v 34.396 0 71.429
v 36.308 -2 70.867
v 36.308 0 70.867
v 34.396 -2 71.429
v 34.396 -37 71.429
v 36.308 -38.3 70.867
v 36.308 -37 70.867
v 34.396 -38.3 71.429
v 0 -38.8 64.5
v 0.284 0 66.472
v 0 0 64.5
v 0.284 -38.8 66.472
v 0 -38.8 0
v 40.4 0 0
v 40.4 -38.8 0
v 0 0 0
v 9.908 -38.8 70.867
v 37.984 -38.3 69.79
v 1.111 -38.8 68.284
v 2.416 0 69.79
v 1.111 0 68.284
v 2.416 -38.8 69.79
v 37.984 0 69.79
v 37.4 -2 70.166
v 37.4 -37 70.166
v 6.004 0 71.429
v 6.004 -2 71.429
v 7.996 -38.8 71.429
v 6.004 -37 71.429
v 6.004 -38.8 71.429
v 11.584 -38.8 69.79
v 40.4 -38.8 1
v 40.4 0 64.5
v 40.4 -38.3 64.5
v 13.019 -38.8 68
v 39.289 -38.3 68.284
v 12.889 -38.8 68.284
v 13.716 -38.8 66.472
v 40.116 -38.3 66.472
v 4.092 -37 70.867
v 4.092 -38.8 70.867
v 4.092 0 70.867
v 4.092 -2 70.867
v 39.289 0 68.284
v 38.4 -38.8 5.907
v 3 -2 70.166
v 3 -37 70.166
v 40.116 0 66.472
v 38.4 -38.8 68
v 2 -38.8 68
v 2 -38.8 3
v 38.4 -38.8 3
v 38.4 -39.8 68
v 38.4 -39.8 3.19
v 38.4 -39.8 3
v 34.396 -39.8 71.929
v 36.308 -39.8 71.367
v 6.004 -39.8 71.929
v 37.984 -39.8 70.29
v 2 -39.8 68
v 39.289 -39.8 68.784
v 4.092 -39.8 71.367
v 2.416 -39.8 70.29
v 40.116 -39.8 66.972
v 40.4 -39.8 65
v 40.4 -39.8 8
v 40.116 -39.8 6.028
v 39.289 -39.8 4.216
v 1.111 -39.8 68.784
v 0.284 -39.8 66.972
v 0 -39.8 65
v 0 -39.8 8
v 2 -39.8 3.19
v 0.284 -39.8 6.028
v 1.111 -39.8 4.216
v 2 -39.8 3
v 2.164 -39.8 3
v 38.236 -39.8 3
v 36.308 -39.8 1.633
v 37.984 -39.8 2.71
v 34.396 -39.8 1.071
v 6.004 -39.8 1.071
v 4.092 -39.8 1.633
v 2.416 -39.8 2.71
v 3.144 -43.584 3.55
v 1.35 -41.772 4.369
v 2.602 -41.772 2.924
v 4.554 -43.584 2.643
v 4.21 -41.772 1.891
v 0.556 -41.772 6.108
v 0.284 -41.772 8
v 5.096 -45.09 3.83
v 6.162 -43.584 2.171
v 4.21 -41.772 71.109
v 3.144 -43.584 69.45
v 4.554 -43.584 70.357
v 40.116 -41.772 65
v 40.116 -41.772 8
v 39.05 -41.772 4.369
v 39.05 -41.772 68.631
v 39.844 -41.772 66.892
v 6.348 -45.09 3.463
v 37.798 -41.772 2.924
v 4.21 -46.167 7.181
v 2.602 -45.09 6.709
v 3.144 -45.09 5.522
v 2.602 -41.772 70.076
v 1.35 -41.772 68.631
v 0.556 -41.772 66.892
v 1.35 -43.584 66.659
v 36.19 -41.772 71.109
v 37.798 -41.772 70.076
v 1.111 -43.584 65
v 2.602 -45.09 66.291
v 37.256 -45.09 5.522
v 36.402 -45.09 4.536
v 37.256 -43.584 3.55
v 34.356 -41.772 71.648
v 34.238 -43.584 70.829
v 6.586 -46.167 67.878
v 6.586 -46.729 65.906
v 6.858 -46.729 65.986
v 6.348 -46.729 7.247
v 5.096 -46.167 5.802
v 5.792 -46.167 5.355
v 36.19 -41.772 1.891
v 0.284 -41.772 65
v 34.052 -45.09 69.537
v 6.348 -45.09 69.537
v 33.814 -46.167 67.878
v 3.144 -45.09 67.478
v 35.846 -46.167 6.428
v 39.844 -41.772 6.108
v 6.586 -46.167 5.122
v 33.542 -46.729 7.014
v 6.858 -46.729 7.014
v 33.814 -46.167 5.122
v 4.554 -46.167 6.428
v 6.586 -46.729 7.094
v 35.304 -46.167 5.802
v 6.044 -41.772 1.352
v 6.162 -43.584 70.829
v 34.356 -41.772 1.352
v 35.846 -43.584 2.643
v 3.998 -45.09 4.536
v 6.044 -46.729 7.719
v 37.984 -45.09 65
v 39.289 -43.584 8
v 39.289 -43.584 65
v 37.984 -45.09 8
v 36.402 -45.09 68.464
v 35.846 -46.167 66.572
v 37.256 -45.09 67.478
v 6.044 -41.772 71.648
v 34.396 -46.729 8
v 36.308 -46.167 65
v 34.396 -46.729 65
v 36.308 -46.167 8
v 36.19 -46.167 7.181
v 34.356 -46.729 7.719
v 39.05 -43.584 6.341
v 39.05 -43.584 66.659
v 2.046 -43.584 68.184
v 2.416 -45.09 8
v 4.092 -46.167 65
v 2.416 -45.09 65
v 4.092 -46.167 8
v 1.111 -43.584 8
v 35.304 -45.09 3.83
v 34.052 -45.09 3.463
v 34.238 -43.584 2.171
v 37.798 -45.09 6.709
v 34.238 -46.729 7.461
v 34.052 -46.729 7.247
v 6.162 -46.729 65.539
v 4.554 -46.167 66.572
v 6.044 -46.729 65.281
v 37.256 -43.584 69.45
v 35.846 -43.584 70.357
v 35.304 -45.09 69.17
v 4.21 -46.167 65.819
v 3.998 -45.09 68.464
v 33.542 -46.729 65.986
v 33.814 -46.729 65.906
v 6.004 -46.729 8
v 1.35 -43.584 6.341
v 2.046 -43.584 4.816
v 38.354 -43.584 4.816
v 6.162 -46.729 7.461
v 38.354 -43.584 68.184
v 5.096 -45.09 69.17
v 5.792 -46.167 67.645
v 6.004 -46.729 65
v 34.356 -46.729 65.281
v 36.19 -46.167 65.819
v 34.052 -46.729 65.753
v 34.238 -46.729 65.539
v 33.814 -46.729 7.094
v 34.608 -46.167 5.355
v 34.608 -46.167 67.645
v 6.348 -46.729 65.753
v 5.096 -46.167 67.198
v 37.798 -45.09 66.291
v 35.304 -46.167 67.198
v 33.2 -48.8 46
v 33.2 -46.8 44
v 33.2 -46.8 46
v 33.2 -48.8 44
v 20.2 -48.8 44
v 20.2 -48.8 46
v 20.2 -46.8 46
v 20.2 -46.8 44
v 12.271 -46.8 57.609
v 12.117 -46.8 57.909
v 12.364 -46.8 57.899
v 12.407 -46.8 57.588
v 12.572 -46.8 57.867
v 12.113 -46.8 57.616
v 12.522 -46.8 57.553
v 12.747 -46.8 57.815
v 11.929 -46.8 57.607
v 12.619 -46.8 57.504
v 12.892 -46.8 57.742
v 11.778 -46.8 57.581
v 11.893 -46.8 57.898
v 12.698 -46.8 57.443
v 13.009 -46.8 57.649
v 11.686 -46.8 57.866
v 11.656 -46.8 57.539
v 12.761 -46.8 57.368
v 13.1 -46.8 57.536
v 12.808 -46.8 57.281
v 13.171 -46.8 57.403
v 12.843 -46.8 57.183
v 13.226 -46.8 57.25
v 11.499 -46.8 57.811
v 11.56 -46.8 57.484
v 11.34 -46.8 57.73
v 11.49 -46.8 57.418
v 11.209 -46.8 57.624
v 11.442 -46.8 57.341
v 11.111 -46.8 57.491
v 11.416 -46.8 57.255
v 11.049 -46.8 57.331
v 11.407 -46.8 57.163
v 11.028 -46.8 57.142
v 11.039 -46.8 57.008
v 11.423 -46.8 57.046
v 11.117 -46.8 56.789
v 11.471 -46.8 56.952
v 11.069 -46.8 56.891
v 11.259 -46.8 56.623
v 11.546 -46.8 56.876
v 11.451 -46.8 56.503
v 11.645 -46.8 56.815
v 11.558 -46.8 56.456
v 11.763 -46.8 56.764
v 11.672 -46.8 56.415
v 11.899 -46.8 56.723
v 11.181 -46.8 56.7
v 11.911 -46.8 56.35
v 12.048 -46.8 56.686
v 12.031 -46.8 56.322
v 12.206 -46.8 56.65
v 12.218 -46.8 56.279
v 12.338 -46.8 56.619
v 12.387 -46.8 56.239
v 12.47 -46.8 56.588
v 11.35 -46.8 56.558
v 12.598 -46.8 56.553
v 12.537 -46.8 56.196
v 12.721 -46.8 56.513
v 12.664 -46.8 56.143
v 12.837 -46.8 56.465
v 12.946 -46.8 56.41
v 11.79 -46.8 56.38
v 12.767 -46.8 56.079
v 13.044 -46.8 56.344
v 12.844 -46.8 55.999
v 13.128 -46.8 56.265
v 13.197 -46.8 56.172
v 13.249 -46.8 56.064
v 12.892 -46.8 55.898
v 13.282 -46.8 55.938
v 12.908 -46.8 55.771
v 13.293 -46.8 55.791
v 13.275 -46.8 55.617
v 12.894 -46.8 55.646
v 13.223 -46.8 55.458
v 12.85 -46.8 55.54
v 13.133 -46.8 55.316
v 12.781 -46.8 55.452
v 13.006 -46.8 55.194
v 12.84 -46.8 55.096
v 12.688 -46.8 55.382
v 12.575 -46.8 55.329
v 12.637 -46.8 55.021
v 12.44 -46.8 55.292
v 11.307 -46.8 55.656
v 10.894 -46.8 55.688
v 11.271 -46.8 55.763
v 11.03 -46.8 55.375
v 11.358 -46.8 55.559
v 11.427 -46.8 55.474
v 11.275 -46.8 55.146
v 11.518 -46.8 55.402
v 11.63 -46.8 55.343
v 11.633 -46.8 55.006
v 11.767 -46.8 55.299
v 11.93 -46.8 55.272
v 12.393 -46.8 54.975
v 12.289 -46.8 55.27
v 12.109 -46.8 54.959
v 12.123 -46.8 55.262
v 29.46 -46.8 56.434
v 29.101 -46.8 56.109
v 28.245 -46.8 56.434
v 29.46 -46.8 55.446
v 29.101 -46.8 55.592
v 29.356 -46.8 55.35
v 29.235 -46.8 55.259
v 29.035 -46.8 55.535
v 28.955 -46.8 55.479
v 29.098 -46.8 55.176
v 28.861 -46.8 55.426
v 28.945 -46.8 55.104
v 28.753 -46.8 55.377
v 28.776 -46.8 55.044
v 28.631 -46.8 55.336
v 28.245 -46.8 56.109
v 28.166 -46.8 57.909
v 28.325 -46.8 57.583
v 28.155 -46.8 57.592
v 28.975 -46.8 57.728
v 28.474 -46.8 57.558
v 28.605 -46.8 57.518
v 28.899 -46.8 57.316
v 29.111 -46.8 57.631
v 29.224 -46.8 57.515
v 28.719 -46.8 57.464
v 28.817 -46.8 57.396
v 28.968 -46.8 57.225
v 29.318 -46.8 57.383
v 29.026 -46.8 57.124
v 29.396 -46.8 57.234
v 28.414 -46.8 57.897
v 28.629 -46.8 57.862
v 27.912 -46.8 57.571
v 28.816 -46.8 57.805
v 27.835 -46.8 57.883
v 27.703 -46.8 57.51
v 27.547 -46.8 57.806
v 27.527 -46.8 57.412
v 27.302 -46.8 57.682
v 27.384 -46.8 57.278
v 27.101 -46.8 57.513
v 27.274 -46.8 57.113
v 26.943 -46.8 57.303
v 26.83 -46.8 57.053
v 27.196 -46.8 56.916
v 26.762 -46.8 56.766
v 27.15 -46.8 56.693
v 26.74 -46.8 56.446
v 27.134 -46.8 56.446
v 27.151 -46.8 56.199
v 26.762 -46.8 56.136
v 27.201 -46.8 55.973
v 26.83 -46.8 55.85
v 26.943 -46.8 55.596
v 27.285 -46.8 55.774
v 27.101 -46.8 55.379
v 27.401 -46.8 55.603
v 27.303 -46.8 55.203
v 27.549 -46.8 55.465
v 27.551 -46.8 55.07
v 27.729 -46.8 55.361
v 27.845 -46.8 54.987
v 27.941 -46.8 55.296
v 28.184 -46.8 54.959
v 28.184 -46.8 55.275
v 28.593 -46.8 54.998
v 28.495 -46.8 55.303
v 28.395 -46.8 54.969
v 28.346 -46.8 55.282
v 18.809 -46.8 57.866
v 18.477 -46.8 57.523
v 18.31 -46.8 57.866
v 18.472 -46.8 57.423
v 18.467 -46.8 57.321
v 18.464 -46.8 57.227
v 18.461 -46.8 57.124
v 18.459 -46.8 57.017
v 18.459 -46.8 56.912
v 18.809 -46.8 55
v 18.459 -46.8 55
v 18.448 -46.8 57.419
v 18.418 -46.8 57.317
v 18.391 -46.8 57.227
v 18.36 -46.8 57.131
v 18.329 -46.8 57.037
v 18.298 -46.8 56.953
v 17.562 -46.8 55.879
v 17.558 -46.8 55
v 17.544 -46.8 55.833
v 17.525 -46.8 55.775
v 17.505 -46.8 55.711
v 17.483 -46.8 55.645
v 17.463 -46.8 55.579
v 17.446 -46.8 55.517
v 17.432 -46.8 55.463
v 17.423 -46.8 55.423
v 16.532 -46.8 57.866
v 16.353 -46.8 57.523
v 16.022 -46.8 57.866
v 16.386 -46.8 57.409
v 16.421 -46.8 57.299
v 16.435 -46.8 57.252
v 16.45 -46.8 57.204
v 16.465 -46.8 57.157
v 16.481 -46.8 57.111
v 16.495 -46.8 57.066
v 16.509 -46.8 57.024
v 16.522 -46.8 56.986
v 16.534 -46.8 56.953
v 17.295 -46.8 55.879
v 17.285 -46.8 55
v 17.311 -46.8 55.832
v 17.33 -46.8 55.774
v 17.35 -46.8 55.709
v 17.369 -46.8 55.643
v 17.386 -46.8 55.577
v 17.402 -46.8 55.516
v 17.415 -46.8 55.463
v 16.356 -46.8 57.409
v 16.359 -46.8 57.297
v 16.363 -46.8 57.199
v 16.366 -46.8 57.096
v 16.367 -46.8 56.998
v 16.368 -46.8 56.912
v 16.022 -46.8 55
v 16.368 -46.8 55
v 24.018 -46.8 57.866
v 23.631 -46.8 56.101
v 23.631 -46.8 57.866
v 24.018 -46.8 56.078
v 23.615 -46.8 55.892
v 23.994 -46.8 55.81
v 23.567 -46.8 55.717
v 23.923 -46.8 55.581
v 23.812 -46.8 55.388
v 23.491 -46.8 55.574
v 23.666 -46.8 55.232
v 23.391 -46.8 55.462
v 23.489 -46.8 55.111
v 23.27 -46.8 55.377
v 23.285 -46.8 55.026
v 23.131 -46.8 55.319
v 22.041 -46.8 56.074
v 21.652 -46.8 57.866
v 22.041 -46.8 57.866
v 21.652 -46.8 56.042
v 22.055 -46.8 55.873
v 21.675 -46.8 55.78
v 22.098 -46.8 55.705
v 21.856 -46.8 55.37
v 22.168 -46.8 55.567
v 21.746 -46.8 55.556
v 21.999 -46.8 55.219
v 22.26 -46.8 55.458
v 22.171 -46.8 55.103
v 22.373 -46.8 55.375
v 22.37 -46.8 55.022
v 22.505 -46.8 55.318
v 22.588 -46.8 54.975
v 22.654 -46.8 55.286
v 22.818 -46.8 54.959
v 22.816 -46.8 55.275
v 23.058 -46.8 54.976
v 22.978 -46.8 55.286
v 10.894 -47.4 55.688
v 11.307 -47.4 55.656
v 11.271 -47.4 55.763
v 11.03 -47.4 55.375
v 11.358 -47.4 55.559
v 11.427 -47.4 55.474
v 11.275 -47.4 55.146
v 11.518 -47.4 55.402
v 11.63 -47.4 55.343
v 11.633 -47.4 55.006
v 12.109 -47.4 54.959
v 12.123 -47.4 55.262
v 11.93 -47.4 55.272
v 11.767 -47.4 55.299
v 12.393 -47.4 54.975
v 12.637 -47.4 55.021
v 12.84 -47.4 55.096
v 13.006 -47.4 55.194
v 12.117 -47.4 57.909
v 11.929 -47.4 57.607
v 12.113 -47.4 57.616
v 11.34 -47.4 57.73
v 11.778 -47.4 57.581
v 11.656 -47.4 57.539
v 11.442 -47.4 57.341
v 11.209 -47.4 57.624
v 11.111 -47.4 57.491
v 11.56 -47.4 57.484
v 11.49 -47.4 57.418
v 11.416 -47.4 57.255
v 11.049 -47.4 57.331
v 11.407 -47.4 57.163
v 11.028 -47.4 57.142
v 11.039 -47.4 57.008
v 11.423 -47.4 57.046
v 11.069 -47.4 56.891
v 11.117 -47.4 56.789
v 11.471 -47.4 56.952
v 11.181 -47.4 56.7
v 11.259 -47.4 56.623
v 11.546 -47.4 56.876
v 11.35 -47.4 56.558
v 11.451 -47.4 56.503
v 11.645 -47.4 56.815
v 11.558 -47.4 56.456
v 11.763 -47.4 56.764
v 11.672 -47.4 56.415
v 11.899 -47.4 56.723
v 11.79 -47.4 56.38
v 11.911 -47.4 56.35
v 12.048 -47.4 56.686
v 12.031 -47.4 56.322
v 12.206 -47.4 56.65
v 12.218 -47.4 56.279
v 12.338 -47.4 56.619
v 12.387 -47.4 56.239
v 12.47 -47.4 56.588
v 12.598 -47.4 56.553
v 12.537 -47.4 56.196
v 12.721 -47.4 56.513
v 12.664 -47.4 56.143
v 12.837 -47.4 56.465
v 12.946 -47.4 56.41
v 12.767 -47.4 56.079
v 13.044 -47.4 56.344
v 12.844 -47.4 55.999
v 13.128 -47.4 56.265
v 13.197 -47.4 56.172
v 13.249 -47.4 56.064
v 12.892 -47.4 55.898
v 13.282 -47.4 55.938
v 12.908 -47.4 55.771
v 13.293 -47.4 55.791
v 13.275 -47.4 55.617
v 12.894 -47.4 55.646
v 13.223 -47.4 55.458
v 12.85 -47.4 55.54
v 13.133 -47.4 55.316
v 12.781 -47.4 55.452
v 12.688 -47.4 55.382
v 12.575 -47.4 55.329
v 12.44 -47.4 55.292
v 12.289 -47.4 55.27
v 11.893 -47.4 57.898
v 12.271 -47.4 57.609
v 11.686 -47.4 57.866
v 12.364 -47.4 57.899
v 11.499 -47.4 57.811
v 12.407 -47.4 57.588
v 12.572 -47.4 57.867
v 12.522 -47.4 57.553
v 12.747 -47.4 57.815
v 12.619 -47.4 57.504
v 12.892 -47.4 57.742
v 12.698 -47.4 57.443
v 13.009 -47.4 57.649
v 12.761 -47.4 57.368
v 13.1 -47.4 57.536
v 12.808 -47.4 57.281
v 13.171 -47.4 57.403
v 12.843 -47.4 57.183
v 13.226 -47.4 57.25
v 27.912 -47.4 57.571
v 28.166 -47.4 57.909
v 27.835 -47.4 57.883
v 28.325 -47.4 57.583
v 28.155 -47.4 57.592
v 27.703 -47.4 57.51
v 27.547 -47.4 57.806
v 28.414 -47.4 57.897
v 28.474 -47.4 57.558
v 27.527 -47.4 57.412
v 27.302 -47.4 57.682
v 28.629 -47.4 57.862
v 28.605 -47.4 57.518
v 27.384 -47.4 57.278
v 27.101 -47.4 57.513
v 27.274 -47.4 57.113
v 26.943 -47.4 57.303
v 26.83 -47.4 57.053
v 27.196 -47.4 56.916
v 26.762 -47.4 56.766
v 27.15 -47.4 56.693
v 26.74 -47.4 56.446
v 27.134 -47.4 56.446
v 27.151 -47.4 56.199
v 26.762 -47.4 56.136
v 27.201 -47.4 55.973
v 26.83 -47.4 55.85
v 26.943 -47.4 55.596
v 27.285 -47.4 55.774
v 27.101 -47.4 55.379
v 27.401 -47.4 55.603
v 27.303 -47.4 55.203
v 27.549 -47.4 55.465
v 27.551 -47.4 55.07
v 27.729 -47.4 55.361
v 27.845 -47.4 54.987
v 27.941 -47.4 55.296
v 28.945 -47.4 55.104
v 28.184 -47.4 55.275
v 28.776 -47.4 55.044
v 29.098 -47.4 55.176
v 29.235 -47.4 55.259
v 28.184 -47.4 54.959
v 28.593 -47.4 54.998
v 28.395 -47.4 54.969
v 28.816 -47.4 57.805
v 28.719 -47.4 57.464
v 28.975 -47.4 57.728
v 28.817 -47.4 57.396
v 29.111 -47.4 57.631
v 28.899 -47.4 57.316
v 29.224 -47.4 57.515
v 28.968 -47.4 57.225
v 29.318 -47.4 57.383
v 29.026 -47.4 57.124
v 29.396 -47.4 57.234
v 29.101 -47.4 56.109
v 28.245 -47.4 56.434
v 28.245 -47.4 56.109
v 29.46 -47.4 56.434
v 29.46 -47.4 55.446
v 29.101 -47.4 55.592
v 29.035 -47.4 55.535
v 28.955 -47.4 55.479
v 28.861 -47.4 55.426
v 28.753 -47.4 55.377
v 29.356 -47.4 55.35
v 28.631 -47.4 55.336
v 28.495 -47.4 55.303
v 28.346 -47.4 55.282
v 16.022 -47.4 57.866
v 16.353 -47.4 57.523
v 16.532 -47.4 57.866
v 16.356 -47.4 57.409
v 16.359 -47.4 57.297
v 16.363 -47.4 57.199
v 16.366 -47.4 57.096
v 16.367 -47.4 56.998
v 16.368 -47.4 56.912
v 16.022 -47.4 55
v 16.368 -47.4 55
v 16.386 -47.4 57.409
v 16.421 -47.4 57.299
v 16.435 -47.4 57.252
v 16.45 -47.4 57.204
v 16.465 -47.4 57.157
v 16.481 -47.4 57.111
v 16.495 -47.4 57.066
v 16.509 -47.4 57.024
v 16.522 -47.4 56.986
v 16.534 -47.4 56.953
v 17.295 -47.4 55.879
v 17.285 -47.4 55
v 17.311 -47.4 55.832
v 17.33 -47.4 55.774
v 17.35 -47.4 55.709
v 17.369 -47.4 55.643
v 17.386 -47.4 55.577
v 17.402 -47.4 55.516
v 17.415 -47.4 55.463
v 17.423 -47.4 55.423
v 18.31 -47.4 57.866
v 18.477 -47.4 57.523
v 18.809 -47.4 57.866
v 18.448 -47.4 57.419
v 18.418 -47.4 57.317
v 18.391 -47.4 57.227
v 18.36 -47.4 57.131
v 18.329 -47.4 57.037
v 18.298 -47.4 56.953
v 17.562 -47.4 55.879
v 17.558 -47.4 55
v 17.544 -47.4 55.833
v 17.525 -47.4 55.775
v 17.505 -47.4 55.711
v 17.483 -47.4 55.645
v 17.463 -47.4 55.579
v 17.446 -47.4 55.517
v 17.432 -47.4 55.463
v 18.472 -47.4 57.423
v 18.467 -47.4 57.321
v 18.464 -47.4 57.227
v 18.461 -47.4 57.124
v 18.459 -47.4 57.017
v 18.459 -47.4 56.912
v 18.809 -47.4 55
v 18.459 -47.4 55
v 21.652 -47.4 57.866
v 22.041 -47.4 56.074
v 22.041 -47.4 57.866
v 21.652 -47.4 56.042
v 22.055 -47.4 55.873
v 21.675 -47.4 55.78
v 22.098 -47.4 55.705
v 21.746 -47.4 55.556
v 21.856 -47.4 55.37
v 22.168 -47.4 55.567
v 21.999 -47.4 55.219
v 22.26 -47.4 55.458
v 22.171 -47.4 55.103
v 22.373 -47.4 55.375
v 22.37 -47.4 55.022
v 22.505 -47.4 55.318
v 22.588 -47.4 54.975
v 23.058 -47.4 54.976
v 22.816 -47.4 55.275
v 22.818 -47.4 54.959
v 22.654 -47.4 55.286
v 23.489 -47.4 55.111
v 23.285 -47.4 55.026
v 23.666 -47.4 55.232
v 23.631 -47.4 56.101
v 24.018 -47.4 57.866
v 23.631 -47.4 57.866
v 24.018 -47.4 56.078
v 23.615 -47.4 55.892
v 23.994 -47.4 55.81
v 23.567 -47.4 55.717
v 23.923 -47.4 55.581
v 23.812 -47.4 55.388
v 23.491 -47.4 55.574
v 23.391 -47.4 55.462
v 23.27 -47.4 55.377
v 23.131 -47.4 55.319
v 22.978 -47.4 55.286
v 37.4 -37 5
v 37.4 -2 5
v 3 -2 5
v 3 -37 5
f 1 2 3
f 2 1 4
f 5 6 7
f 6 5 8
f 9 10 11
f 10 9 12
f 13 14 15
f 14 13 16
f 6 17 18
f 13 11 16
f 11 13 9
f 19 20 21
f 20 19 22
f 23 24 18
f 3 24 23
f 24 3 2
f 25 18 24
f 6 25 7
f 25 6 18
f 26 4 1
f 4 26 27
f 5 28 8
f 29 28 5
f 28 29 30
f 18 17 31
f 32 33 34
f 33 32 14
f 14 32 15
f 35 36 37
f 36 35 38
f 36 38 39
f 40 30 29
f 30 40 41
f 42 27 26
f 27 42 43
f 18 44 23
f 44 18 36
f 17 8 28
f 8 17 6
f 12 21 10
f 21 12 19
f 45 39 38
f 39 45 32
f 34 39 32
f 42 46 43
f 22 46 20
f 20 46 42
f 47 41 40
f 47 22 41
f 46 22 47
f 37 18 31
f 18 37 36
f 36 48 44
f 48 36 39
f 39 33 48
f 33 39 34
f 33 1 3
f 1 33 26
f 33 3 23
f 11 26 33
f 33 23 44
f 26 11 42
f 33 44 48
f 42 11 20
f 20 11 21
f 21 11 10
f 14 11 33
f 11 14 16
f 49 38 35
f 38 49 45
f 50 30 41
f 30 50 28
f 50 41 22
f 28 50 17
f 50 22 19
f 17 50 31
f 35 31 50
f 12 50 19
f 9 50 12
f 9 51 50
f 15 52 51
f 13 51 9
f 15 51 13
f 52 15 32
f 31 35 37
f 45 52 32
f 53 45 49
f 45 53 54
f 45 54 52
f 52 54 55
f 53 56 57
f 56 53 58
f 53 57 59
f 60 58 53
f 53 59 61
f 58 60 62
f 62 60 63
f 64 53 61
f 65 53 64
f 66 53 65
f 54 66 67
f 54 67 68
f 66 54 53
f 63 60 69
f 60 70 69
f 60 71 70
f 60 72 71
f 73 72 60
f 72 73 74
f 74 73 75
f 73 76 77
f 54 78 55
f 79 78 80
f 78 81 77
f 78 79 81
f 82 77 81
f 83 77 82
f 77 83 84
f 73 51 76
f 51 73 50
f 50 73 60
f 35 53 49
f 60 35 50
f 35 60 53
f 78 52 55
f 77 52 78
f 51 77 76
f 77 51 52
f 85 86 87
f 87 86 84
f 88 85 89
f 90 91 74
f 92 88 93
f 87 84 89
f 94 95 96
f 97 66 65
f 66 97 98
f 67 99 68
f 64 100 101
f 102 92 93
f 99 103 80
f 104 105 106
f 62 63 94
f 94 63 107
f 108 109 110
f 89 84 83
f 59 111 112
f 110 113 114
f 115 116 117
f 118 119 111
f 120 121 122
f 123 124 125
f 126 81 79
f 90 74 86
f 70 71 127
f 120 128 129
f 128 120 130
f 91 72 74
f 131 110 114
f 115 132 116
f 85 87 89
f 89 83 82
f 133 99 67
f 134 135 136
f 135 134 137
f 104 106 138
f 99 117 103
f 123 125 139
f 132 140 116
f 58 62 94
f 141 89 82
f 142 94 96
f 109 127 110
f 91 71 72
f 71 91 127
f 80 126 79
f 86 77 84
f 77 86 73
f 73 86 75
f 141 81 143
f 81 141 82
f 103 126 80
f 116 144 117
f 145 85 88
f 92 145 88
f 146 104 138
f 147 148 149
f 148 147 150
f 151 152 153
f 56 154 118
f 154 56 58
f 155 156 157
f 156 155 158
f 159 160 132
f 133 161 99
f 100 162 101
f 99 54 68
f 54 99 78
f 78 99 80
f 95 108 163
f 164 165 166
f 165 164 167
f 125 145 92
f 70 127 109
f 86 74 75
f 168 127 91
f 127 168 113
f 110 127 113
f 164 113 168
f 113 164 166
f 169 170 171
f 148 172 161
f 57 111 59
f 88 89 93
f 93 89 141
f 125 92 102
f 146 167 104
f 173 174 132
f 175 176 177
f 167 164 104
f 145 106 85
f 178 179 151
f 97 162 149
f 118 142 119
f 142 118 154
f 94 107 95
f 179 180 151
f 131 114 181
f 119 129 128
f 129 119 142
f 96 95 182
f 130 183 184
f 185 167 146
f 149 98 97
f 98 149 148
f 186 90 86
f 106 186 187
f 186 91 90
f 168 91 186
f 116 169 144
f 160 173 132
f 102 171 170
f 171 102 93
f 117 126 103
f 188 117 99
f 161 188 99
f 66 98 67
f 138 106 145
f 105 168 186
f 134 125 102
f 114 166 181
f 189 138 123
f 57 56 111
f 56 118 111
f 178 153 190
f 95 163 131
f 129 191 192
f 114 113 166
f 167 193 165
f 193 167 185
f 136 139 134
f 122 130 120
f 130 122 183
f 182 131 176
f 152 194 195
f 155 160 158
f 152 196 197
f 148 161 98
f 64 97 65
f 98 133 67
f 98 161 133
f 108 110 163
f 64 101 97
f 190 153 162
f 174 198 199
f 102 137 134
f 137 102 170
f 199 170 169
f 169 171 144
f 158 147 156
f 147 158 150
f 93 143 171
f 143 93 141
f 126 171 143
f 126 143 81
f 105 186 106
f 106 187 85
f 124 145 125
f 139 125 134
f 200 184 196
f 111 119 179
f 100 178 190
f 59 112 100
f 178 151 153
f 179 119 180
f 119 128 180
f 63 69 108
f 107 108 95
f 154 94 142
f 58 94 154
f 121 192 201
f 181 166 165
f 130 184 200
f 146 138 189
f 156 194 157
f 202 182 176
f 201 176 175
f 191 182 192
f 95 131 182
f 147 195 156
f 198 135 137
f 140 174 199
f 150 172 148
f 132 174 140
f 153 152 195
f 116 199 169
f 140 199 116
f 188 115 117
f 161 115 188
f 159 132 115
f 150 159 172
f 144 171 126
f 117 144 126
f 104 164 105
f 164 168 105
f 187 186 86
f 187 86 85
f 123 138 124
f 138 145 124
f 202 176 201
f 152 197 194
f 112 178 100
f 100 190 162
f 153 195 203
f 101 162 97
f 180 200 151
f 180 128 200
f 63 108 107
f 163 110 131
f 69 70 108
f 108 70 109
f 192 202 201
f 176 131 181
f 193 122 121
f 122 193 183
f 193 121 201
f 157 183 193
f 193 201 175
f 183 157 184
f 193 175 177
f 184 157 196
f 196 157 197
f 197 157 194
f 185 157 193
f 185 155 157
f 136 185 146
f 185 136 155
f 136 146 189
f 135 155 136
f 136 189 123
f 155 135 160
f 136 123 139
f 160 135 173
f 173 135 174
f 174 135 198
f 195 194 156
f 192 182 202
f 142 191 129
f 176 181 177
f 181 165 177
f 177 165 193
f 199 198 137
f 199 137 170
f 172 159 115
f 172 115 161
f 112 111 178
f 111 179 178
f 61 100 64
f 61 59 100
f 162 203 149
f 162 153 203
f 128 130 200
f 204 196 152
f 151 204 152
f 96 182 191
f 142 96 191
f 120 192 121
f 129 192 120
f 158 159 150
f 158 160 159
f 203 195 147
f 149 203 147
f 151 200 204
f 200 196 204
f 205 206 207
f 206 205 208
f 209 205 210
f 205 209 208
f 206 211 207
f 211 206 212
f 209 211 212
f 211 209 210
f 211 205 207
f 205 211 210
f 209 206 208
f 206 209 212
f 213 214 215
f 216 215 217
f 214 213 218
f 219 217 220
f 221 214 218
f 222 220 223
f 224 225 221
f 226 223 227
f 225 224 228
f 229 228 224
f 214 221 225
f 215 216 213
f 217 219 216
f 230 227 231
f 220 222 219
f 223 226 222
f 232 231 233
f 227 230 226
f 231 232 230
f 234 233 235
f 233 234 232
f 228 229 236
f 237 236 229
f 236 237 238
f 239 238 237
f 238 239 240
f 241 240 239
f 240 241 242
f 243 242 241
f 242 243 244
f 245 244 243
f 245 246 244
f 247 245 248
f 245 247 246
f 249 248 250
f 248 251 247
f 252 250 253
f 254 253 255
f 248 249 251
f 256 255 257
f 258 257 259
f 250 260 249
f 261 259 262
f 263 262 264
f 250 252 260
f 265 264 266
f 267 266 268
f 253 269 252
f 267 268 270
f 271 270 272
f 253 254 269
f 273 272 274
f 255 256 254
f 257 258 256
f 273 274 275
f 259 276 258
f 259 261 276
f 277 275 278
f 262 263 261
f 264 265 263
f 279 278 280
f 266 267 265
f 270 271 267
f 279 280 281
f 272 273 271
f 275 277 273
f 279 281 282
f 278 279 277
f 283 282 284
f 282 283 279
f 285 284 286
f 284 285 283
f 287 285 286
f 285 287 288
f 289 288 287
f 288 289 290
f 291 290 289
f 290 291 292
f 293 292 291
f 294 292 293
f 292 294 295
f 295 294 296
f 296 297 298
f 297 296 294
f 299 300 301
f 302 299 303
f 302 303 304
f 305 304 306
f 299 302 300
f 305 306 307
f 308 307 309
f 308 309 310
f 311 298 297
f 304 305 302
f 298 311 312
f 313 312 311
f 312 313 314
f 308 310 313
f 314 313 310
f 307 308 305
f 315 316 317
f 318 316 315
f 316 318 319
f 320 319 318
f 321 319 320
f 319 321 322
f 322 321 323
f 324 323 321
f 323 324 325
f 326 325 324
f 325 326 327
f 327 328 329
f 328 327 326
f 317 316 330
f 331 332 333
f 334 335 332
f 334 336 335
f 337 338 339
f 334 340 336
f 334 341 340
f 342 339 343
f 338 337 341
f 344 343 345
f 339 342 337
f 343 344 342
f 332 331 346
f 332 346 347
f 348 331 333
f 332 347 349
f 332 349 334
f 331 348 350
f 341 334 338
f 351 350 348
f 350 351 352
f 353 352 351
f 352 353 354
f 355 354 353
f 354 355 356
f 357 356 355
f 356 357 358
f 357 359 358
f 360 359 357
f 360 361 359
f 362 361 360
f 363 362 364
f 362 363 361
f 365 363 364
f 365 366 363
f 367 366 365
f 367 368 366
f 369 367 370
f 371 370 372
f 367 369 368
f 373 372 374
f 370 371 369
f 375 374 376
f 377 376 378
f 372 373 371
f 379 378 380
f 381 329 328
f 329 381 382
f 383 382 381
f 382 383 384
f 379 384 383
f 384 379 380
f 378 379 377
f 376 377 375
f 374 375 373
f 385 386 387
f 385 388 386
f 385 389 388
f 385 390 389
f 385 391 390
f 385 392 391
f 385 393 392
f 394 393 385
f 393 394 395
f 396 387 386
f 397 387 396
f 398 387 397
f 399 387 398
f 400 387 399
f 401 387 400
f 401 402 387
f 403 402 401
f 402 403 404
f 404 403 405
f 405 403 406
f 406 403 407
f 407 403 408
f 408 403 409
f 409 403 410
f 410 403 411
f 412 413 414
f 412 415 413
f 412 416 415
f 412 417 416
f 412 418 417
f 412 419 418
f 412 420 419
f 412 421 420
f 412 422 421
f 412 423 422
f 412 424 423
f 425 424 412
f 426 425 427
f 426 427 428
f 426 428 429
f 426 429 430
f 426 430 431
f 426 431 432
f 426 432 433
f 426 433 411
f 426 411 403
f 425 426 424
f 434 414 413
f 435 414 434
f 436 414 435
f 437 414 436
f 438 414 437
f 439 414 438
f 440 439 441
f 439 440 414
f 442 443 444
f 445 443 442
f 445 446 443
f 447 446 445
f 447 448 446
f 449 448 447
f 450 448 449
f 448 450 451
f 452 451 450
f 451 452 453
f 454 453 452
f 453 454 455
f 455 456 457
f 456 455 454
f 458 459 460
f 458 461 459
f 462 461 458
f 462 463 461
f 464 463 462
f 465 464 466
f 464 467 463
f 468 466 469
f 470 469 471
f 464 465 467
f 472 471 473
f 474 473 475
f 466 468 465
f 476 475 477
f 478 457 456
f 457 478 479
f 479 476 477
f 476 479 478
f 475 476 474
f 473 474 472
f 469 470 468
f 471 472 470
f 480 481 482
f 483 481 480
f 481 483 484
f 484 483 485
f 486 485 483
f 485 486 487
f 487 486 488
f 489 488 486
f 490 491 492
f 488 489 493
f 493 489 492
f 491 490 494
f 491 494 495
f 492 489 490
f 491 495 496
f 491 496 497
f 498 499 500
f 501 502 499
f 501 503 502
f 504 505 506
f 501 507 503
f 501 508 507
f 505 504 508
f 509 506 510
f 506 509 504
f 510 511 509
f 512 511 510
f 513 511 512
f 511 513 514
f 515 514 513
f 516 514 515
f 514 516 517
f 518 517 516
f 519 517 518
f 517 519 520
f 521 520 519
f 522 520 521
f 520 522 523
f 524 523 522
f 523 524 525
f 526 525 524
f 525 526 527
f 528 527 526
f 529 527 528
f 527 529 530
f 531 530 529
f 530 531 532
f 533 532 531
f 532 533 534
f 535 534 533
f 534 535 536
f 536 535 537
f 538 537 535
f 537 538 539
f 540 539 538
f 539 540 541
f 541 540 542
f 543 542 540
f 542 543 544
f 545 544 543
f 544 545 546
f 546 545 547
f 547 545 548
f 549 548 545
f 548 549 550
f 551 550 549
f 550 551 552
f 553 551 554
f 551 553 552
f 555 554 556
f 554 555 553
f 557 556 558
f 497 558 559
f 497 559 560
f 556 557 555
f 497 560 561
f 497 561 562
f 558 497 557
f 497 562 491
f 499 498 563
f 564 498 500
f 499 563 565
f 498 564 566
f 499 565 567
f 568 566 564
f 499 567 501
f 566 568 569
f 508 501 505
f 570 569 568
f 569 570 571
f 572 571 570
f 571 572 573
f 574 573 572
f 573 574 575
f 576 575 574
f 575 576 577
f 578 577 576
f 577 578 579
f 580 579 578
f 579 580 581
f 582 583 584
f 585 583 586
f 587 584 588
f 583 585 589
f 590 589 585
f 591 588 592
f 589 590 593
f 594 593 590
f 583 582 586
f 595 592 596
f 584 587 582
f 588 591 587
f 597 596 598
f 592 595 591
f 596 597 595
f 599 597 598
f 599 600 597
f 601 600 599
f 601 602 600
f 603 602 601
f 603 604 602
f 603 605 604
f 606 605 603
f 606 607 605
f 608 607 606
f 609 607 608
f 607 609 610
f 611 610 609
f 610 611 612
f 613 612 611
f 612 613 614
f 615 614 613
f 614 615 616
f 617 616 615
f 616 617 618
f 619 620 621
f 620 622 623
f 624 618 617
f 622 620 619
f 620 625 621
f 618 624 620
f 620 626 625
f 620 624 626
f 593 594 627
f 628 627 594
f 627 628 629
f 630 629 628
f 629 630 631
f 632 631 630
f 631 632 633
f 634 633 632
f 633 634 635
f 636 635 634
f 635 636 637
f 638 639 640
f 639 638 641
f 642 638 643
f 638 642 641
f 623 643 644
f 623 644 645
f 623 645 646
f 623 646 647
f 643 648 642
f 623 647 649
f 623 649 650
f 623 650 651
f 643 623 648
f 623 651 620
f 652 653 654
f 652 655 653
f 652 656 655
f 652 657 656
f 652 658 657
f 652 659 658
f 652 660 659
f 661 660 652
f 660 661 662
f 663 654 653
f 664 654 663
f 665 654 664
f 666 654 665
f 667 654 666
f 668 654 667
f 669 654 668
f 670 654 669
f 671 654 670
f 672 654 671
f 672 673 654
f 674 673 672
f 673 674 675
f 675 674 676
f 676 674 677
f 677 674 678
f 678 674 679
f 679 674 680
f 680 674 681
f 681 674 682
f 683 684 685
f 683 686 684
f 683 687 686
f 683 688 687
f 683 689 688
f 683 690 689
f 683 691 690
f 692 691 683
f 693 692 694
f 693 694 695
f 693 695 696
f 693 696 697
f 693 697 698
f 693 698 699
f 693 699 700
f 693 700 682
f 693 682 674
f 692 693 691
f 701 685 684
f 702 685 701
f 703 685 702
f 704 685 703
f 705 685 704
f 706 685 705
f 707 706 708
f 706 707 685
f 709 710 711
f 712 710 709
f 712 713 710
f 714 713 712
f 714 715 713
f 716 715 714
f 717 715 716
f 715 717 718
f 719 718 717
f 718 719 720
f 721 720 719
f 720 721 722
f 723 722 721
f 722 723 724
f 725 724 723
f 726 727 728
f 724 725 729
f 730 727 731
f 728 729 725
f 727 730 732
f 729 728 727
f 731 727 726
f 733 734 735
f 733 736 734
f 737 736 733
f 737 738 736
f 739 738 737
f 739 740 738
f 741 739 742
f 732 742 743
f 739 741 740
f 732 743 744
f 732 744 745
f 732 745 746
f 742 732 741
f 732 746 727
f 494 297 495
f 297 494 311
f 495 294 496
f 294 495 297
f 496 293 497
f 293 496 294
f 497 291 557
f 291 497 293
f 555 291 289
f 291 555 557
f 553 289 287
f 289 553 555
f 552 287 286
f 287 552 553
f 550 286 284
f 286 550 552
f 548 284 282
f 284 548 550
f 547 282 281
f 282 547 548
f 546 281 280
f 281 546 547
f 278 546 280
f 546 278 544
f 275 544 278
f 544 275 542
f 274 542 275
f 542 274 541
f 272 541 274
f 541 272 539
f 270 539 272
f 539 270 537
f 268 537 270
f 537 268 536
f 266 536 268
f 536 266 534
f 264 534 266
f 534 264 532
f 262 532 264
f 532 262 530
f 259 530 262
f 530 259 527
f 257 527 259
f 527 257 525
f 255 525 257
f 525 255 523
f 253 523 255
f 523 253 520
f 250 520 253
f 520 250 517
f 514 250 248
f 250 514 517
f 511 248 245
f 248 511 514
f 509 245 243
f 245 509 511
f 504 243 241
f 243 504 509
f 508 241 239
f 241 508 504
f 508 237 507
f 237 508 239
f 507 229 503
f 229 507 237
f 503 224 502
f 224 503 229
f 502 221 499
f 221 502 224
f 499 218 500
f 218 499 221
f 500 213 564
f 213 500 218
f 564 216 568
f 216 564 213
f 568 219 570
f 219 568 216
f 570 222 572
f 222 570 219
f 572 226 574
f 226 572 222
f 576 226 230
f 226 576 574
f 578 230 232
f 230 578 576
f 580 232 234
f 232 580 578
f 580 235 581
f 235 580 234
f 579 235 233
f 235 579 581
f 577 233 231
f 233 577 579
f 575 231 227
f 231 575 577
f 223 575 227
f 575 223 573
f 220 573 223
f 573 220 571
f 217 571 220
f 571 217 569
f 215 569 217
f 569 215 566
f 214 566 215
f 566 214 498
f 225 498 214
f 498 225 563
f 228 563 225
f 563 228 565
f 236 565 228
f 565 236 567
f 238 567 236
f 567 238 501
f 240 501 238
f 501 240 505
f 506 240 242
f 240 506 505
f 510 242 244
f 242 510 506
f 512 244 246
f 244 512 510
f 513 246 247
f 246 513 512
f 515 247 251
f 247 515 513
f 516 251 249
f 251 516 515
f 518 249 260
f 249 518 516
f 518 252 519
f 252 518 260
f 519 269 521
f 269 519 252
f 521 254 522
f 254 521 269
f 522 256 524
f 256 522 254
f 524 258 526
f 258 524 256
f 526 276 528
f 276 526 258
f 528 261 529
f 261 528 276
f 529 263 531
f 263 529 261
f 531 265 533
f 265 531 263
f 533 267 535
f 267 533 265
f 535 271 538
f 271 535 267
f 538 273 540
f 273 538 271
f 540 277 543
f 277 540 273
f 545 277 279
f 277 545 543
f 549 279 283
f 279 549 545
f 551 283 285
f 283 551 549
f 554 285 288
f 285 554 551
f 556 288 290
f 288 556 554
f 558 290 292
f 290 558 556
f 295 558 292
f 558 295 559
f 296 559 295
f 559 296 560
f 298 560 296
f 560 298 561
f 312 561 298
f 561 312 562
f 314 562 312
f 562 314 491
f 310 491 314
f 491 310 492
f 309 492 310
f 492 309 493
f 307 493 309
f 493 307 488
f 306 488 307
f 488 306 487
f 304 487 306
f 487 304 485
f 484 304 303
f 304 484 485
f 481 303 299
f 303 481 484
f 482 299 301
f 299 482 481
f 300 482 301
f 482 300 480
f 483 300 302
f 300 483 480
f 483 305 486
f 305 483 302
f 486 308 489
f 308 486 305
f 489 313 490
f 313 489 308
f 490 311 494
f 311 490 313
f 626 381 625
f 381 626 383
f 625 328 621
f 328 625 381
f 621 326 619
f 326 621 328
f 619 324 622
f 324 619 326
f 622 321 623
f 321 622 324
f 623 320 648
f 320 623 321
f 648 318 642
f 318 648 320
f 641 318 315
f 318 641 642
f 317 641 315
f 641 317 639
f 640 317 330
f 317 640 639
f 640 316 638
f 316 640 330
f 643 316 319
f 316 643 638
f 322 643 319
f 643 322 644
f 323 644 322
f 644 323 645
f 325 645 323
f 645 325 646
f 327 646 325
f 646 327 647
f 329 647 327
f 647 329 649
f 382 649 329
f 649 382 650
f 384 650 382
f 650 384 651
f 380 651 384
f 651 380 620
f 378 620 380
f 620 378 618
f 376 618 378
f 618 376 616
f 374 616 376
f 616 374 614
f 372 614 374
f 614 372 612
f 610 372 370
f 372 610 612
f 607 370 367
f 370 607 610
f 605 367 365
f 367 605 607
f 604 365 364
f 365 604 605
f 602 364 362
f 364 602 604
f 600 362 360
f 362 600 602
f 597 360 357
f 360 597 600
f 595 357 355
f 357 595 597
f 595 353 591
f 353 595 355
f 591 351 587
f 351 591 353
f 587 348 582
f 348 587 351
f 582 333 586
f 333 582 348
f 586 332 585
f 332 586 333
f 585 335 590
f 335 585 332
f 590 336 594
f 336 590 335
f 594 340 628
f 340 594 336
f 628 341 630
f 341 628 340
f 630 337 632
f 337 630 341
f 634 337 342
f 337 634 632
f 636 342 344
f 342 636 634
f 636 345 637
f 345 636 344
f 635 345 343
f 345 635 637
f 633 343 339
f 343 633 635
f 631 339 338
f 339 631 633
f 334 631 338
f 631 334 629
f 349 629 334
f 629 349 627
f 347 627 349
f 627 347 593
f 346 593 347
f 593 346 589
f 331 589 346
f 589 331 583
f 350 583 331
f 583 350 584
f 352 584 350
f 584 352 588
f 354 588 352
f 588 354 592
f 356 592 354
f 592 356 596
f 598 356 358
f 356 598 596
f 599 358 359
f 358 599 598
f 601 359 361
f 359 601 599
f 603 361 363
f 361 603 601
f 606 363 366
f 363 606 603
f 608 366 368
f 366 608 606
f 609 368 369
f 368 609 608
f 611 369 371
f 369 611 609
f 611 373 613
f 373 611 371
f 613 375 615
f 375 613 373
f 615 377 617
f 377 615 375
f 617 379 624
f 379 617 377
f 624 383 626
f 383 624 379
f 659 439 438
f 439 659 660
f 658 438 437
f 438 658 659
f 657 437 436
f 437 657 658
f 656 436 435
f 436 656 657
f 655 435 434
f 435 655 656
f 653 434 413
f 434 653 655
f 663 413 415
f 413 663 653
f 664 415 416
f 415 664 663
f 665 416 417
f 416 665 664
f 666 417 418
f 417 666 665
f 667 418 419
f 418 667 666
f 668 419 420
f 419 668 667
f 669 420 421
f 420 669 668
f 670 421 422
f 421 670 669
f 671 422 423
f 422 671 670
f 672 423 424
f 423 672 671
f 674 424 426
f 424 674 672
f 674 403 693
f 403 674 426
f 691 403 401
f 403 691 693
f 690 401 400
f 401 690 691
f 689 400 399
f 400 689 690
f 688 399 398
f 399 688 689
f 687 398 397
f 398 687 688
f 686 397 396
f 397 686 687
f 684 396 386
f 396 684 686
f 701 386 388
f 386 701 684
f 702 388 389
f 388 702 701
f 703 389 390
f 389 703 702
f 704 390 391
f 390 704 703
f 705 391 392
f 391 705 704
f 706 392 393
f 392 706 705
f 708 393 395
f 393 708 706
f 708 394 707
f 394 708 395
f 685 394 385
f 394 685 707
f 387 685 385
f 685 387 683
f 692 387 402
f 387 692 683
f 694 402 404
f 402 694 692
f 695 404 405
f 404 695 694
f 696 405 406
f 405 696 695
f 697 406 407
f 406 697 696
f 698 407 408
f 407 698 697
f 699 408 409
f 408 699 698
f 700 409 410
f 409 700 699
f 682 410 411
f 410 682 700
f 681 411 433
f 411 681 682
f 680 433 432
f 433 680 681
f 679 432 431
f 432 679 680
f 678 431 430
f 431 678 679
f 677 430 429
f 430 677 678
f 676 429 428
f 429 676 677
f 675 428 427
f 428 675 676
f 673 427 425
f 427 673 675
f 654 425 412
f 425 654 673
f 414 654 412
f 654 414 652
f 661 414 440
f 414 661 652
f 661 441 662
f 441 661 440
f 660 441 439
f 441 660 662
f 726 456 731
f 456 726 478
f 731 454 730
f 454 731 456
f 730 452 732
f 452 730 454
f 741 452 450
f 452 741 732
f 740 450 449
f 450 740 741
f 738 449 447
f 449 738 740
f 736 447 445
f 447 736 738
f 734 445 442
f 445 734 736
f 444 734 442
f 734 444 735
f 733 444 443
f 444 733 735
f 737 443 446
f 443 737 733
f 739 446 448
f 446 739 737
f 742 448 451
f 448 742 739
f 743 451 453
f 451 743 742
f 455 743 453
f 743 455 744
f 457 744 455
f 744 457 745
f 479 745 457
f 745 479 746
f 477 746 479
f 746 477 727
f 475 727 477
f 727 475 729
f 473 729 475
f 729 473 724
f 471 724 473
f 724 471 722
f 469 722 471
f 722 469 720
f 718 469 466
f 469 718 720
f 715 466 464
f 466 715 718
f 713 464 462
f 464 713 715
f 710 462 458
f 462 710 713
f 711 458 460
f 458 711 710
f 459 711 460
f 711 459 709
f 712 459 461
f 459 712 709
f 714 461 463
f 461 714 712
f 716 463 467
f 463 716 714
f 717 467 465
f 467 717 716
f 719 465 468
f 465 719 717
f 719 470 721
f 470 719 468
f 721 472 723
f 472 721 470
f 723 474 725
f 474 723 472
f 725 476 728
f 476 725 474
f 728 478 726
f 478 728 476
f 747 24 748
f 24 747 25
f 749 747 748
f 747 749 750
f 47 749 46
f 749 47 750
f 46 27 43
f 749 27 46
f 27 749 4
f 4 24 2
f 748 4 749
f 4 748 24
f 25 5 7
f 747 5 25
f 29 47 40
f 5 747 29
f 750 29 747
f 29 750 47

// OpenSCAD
// Mini Fridge

module halfSphere(rad) { 
    difference() {
        sphere(rad);
        translate([0,0,-rad]) cube([rad*2,rad*2,rad*2],center=true);
    }
}


module body() {
    hull() {
        translate([7,64.5,0]) cylinder(h=38.8,r=7);
        translate([40.4-7,64.5,0]) cylinder(h=38.3,r=7);
        cube([40.4,1,38.8]);
    }
    translate([2,3,38.8]) cube([40.4-4,65,1]);
    translate([0,1,39.8]) {
        hull() {
            translate([7,7,0]) halfSphere(7);
            translate([40.4-7,7,0]) halfSphere(7);
            translate([7,64.0,0]) halfSphere(7);
            translate([40.4-7,64.0,0]) halfSphere(7);
        }
    }
    translate([40.4/2,44,39.8+7]) {
        cube([13,2,2]);
    }
    translate([40.4/2,55,39.8+7])
        linear_extrude(height=0.6)
            text(text="S  M  U  G",halign = "center",size=3);
}

difference() {
    rotate([90,0,0]) body();
    translate([3,-37,5]) cube([40.4-6,35,99]);
}
